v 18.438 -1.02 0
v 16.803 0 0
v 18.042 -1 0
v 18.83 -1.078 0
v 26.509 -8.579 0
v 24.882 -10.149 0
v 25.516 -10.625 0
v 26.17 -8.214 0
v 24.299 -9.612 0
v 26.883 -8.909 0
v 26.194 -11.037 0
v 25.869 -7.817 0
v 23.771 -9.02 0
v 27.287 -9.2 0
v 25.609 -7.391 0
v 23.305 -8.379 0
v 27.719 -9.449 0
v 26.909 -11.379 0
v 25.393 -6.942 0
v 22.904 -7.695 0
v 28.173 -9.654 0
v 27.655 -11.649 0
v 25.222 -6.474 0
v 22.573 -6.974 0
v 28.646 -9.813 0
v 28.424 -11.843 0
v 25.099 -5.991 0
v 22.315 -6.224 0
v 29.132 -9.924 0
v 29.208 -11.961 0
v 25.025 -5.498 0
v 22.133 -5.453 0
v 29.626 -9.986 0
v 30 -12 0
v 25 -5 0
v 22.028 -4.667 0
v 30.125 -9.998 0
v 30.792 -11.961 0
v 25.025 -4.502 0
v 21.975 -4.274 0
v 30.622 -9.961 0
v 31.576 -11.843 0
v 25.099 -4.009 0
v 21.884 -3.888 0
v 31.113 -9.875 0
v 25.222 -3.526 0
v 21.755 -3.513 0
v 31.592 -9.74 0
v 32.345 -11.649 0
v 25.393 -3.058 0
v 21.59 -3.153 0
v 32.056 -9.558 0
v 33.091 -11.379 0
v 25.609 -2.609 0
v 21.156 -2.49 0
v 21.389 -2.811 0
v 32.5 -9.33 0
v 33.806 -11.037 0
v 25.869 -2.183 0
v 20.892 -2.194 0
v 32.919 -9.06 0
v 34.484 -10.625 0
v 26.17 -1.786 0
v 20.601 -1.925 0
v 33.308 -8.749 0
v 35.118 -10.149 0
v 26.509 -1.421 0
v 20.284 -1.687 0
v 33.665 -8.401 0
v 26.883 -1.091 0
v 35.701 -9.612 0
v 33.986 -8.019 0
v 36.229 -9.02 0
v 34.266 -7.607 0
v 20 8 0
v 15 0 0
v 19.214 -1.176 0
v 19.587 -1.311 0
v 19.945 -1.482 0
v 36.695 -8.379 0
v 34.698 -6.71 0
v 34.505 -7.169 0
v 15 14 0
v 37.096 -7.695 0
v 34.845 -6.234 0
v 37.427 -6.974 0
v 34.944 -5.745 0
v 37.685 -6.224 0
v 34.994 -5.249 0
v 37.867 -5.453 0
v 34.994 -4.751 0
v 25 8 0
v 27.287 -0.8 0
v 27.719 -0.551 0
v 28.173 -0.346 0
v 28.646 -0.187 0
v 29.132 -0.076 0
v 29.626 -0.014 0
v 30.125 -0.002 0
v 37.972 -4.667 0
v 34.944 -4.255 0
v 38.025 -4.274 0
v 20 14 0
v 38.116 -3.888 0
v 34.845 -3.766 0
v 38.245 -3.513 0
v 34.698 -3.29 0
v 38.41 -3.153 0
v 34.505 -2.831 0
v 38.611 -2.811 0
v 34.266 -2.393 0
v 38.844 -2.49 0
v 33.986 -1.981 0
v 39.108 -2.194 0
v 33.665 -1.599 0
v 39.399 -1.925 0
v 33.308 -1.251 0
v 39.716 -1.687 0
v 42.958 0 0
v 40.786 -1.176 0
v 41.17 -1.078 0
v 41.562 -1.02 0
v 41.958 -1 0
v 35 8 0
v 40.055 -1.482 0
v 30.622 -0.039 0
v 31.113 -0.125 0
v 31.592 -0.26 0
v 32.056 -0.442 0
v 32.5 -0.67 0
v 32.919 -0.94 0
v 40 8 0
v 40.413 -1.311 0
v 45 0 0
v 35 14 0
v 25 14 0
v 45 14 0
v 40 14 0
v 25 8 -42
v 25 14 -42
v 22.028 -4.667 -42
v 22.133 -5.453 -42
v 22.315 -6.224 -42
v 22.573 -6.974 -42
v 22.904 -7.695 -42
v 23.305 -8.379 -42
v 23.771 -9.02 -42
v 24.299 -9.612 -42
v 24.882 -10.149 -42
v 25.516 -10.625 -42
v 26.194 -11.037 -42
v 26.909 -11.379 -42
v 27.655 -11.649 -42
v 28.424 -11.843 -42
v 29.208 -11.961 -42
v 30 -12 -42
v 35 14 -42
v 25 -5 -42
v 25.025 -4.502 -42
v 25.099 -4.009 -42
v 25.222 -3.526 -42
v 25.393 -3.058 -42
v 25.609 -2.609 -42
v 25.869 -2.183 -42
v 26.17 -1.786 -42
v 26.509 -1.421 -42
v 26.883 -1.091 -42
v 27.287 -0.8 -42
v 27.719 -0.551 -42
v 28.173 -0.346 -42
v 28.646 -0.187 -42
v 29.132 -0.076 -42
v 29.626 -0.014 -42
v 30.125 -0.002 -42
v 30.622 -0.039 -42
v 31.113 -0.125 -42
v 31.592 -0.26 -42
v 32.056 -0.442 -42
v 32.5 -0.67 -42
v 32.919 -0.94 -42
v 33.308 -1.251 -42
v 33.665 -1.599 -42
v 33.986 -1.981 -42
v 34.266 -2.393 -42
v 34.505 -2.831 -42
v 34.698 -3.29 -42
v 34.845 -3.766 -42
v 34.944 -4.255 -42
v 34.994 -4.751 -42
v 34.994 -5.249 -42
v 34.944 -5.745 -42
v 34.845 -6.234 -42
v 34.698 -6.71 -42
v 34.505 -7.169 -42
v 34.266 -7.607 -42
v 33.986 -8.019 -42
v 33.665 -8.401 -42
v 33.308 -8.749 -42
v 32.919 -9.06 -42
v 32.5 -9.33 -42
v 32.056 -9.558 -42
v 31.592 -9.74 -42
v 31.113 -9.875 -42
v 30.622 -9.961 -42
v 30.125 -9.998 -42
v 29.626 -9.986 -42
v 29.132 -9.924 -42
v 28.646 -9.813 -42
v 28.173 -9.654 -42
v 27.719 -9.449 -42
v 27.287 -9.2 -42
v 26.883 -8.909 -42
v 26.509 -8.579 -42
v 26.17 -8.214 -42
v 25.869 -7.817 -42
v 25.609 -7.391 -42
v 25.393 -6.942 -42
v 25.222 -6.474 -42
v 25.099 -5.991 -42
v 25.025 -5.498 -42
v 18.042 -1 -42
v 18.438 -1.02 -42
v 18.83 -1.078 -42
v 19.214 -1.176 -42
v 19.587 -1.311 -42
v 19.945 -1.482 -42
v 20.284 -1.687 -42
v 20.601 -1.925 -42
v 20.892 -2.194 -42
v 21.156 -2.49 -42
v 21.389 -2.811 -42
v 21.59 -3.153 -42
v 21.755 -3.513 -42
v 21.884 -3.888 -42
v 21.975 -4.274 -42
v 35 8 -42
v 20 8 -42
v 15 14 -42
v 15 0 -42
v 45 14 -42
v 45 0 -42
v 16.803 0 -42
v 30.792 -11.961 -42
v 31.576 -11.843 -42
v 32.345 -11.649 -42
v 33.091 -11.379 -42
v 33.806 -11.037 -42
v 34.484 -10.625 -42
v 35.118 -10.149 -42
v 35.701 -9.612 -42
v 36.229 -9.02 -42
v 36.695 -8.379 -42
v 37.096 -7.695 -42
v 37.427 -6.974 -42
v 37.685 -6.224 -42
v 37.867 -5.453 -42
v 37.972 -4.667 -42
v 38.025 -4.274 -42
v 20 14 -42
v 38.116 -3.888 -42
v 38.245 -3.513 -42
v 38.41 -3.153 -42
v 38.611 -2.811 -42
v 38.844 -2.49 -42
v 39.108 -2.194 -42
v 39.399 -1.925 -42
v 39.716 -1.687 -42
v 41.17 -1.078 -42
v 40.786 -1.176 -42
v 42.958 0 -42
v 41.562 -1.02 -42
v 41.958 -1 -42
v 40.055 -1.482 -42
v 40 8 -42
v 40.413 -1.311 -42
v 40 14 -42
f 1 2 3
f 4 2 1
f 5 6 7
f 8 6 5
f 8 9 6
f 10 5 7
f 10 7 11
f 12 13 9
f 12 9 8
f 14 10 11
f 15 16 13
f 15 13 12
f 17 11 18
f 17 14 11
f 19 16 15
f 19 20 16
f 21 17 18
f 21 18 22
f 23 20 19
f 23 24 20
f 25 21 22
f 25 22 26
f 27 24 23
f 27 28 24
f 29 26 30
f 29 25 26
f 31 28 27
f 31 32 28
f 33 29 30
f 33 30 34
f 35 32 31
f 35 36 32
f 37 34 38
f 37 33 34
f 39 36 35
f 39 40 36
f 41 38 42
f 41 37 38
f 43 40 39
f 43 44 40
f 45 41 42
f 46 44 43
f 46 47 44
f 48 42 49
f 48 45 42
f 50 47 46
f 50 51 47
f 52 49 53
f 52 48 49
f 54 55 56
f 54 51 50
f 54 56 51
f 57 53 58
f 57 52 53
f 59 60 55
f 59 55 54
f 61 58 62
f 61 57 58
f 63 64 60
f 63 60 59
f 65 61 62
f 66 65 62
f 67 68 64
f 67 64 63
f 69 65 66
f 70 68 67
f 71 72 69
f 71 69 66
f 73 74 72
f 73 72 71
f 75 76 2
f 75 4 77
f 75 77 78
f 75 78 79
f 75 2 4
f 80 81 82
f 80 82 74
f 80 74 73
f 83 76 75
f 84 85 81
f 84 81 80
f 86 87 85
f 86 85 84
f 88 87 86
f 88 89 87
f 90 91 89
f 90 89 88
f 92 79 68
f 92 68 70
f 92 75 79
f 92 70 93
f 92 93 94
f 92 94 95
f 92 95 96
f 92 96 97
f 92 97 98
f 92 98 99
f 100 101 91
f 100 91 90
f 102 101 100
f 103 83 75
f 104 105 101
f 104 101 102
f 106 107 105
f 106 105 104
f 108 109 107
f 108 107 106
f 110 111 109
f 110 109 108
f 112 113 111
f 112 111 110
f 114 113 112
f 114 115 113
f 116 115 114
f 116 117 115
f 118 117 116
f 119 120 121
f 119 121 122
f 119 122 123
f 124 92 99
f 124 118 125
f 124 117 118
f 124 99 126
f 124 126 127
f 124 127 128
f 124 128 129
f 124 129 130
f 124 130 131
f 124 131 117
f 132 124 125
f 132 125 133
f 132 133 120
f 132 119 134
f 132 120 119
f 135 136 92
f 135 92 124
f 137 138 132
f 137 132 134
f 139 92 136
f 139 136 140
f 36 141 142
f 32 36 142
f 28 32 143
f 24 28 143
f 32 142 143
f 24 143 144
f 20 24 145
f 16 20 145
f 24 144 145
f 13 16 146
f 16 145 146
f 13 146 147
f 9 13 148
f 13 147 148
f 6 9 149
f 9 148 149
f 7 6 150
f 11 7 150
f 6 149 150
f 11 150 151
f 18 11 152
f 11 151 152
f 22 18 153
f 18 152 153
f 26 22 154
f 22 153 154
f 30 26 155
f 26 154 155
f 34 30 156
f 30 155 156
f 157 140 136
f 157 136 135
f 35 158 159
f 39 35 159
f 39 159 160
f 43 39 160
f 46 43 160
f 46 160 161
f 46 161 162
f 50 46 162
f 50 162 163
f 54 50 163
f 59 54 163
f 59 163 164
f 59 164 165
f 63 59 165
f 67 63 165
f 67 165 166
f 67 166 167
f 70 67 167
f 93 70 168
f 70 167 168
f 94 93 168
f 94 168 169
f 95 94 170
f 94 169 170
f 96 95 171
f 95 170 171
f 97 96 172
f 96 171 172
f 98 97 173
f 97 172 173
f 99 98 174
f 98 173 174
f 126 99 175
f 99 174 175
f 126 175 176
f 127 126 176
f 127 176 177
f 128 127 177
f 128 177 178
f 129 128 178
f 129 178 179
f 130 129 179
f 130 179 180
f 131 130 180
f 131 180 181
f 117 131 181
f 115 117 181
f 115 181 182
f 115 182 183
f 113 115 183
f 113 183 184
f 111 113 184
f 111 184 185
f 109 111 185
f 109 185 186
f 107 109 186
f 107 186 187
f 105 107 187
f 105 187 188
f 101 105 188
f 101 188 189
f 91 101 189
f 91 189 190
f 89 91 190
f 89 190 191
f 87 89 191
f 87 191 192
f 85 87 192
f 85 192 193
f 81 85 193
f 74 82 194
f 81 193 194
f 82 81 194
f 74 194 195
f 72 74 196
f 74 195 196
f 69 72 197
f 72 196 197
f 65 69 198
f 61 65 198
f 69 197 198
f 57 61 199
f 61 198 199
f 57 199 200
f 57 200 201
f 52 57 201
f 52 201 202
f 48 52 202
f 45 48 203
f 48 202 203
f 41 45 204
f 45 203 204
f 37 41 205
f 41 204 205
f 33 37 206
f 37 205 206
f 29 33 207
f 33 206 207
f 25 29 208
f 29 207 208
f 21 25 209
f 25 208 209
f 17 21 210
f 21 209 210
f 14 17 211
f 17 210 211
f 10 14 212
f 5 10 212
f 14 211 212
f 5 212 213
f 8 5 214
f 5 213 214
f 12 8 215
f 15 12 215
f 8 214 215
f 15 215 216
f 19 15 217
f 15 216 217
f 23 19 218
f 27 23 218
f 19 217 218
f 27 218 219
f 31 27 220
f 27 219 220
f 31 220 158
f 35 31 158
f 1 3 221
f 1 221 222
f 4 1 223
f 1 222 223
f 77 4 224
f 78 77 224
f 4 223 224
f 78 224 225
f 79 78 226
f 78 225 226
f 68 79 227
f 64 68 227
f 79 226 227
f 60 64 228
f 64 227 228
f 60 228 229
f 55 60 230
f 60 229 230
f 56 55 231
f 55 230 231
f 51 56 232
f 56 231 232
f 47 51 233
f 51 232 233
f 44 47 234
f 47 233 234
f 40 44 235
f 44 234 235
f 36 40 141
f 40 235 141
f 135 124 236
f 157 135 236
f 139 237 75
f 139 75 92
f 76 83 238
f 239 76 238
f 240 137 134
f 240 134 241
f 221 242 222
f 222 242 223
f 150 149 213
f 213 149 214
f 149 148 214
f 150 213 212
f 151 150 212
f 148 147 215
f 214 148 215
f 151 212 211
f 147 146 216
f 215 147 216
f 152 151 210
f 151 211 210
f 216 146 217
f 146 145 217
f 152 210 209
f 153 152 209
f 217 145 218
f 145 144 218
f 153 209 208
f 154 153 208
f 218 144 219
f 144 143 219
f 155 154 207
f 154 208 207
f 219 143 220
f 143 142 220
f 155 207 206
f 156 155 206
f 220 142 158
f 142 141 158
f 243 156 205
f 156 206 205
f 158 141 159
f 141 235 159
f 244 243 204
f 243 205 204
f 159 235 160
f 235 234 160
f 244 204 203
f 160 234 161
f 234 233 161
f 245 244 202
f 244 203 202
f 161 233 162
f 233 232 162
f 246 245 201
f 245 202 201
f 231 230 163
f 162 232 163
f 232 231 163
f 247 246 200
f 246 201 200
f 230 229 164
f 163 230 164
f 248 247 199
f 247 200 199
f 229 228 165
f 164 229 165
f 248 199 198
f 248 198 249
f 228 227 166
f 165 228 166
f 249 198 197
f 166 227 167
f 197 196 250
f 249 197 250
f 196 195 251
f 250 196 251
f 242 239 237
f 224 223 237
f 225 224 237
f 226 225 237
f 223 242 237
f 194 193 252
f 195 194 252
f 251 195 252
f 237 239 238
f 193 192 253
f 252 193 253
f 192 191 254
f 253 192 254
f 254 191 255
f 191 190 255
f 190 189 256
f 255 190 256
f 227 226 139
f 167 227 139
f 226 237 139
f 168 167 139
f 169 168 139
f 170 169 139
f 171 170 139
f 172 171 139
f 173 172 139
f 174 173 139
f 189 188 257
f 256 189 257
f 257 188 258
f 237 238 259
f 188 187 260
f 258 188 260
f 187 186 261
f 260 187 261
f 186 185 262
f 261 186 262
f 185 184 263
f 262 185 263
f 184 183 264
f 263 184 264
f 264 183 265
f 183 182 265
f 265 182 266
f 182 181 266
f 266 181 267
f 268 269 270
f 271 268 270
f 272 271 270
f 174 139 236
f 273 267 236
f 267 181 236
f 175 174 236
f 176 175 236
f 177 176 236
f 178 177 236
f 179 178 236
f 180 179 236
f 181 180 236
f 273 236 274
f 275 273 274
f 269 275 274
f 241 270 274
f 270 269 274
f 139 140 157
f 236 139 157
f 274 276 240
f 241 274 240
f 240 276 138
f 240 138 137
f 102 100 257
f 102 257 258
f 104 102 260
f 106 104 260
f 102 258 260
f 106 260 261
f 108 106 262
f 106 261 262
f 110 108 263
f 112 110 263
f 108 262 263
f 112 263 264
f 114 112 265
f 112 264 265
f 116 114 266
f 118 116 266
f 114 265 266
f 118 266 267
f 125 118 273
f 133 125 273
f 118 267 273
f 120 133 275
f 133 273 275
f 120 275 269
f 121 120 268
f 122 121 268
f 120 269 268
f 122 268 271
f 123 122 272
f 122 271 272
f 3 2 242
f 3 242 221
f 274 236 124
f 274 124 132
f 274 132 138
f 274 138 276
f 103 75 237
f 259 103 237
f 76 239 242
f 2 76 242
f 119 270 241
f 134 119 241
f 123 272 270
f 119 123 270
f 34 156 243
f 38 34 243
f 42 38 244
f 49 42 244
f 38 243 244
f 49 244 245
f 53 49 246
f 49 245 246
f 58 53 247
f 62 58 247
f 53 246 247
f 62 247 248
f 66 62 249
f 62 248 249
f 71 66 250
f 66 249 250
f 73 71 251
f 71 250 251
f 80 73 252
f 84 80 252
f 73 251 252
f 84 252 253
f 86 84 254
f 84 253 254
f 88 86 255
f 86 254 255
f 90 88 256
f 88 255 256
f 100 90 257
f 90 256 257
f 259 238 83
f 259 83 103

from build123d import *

# Parameters (mm, degrees)
SKETCH1_W           = 60
SKETCH1_H           = 42
BOSS_EXTRUDE1_DEPTH = 8
SKETCH3_W           = 10
SKETCH3_H           = 42
BOSS_EXTRUDE5_DEPTH = 6
SKETCH5_W           = 14
SKETCH5_H           = 42
BOSS_EXTRUDE6_DEPTH = 11
SKETCH6_R           = 5
CUT_EXTRUDE1_DEPTH  = 75.565407529
FILLET1_R           = 7
FILLET2_R           = 5
FILLET3_R           = 5
BOSS_EXTRUDE7_DEPTH = 42
SKETCH9_W           = 5
SKETCH9_H           = 42
BOSS_EXTRUDE8_DEPTH = 6
SKETCH11_W          = 15
SKETCH11_H          = 42
CUT_EXTRUDE2_DEPTH  = 76.921011584


with BuildPart() as part:
    # Sketch1 → Boss-Extrude1 (new body)
    with BuildSketch(Plane(origin=(0, 0, 0), x_dir=(1, 0, 0), z_dir=(0, 1, 0))):
        with Locations((30, 21)):
            Rectangle(SKETCH1_W, SKETCH1_H)
    extrude(amount=BOSS_EXTRUDE1_DEPTH)

    # Sketch3 → Boss-Extrude5 (add)
    with BuildSketch(Plane(origin=(0, 8, 0), x_dir=(1, 0, 0), z_dir=(0, 1, 0))):
        with Locations((30, 21)):
            Rectangle(SKETCH3_W, SKETCH3_H)
    extrude(amount=BOSS_EXTRUDE5_DEPTH)

    # Sketch5 → Boss-Extrude6 (add)
    with BuildSketch(Plane.XZ):
        with Locations((30, -21)):
            Rectangle(SKETCH5_W, SKETCH5_H)
    extrude(amount=BOSS_EXTRUDE6_DEPTH)

    # Sketch6 → Cut-Extrude1 (cut, through all)
    with BuildSketch(Plane(origin=(0, 0, -42), x_dir=(-1, 0, 0), z_dir=(0, 0, -1))):
        with Locations((-30, -5)):
            Circle(SKETCH6_R)
    extrude(amount=-CUT_EXTRUDE1_DEPTH, mode=Mode.SUBTRACT)

    # Fillet1
    fillet1_edges = [part.edges().sort_by_distance(p)[0] for p in [
        (23, -11, -21),
        (37, -11, -21),
    ]]
    fillet(fillet1_edges, radius=FILLET1_R - 0.0001)  # a hair under: the kernel refuses the full size

    # Fillet2
    fillet2_edges = [part.edges().sort_by_distance(p)[0] for p in [
        (23, 0, -21),
    ]]
    fillet(fillet2_edges, radius=FILLET2_R)

    # Fillet3
    fillet3_edges = [part.edges().sort_by_distance(p)[0] for p in [
        (37, 0, -21),
    ]]
    fillet(fillet3_edges, radius=FILLET3_R)

    # Sketch8 → Boss-Extrude7 (add)
    with BuildSketch(Plane(origin=(0, 0, -42), x_dir=(-1, 0, 0), z_dir=(0, 0, -1))):
        with BuildLine():
            Line((-41.958260743, -1), (-42.958260743, 0))
            Line((-42.958260743, 0), (-41.958260743, 0))
            ThreePointArc((-41.958260743, 0), (-38.573244741, -1.320099639), (-36.9756521, -4.583333333))
            ThreePointArc((-36.9756521, -4.583333333), (-34.739022403, -9.151860505), (-30, -11))
            ThreePointArc((-30, -11), (-25.260977597, -9.151860505), (-23.0243479, -4.583333333))
            ThreePointArc((-23.0243479, -4.583333333), (-21.426755259, -1.320099639), (-18.041739257, 0))
            Line((-18.041739257, 0), (-16.803044796, 0))
            Line((-16.803044796, 0), (-18.041739257, -1))
            ThreePointArc((-18.041739257, -1), (-20.749752058, -2.056079711), (-22.027826171, -4.666666667))
            ThreePointArc((-22.027826171, -4.666666667), (-24.583974397, -9.887840578), (-30, -12))
            ThreePointArc((-30, -12), (-35.416025603, -9.887840578), (-37.972173829, -4.666666667))
            ThreePointArc((-37.972173829, -4.666666667), (-39.250247942, -2.056079711), (-41.958260743, -1))
        make_face()
    extrude(amount=-BOSS_EXTRUDE7_DEPTH)

    # Sketch9 → Boss-Extrude8 (add)
    with BuildSketch(Plane(origin=(0, 8, 0), x_dir=(1, 0, 0), z_dir=(0, 1, 0))):
        with Locations((42.5, 21)):
            Rectangle(SKETCH9_W, SKETCH9_H)
        with Locations((17.5, 21)):
            Rectangle(SKETCH9_W, SKETCH9_H)
    extrude(amount=BOSS_EXTRUDE8_DEPTH)

    # Sketch11 → Cut-Extrude2 (cut, through all)
    with BuildSketch(Plane(origin=(0, 8, 0), x_dir=(1, 0, 0), z_dir=(0, 1, 0))):
        with Locations((52.5, 21)):
            Rectangle(SKETCH11_W, SKETCH11_H)
        with Locations((7.5, 21)):
            Rectangle(SKETCH11_W, SKETCH11_H)
    extrude(amount=-CUT_EXTRUDE2_DEPTH, mode=Mode.SUBTRACT)


solid = part.part
